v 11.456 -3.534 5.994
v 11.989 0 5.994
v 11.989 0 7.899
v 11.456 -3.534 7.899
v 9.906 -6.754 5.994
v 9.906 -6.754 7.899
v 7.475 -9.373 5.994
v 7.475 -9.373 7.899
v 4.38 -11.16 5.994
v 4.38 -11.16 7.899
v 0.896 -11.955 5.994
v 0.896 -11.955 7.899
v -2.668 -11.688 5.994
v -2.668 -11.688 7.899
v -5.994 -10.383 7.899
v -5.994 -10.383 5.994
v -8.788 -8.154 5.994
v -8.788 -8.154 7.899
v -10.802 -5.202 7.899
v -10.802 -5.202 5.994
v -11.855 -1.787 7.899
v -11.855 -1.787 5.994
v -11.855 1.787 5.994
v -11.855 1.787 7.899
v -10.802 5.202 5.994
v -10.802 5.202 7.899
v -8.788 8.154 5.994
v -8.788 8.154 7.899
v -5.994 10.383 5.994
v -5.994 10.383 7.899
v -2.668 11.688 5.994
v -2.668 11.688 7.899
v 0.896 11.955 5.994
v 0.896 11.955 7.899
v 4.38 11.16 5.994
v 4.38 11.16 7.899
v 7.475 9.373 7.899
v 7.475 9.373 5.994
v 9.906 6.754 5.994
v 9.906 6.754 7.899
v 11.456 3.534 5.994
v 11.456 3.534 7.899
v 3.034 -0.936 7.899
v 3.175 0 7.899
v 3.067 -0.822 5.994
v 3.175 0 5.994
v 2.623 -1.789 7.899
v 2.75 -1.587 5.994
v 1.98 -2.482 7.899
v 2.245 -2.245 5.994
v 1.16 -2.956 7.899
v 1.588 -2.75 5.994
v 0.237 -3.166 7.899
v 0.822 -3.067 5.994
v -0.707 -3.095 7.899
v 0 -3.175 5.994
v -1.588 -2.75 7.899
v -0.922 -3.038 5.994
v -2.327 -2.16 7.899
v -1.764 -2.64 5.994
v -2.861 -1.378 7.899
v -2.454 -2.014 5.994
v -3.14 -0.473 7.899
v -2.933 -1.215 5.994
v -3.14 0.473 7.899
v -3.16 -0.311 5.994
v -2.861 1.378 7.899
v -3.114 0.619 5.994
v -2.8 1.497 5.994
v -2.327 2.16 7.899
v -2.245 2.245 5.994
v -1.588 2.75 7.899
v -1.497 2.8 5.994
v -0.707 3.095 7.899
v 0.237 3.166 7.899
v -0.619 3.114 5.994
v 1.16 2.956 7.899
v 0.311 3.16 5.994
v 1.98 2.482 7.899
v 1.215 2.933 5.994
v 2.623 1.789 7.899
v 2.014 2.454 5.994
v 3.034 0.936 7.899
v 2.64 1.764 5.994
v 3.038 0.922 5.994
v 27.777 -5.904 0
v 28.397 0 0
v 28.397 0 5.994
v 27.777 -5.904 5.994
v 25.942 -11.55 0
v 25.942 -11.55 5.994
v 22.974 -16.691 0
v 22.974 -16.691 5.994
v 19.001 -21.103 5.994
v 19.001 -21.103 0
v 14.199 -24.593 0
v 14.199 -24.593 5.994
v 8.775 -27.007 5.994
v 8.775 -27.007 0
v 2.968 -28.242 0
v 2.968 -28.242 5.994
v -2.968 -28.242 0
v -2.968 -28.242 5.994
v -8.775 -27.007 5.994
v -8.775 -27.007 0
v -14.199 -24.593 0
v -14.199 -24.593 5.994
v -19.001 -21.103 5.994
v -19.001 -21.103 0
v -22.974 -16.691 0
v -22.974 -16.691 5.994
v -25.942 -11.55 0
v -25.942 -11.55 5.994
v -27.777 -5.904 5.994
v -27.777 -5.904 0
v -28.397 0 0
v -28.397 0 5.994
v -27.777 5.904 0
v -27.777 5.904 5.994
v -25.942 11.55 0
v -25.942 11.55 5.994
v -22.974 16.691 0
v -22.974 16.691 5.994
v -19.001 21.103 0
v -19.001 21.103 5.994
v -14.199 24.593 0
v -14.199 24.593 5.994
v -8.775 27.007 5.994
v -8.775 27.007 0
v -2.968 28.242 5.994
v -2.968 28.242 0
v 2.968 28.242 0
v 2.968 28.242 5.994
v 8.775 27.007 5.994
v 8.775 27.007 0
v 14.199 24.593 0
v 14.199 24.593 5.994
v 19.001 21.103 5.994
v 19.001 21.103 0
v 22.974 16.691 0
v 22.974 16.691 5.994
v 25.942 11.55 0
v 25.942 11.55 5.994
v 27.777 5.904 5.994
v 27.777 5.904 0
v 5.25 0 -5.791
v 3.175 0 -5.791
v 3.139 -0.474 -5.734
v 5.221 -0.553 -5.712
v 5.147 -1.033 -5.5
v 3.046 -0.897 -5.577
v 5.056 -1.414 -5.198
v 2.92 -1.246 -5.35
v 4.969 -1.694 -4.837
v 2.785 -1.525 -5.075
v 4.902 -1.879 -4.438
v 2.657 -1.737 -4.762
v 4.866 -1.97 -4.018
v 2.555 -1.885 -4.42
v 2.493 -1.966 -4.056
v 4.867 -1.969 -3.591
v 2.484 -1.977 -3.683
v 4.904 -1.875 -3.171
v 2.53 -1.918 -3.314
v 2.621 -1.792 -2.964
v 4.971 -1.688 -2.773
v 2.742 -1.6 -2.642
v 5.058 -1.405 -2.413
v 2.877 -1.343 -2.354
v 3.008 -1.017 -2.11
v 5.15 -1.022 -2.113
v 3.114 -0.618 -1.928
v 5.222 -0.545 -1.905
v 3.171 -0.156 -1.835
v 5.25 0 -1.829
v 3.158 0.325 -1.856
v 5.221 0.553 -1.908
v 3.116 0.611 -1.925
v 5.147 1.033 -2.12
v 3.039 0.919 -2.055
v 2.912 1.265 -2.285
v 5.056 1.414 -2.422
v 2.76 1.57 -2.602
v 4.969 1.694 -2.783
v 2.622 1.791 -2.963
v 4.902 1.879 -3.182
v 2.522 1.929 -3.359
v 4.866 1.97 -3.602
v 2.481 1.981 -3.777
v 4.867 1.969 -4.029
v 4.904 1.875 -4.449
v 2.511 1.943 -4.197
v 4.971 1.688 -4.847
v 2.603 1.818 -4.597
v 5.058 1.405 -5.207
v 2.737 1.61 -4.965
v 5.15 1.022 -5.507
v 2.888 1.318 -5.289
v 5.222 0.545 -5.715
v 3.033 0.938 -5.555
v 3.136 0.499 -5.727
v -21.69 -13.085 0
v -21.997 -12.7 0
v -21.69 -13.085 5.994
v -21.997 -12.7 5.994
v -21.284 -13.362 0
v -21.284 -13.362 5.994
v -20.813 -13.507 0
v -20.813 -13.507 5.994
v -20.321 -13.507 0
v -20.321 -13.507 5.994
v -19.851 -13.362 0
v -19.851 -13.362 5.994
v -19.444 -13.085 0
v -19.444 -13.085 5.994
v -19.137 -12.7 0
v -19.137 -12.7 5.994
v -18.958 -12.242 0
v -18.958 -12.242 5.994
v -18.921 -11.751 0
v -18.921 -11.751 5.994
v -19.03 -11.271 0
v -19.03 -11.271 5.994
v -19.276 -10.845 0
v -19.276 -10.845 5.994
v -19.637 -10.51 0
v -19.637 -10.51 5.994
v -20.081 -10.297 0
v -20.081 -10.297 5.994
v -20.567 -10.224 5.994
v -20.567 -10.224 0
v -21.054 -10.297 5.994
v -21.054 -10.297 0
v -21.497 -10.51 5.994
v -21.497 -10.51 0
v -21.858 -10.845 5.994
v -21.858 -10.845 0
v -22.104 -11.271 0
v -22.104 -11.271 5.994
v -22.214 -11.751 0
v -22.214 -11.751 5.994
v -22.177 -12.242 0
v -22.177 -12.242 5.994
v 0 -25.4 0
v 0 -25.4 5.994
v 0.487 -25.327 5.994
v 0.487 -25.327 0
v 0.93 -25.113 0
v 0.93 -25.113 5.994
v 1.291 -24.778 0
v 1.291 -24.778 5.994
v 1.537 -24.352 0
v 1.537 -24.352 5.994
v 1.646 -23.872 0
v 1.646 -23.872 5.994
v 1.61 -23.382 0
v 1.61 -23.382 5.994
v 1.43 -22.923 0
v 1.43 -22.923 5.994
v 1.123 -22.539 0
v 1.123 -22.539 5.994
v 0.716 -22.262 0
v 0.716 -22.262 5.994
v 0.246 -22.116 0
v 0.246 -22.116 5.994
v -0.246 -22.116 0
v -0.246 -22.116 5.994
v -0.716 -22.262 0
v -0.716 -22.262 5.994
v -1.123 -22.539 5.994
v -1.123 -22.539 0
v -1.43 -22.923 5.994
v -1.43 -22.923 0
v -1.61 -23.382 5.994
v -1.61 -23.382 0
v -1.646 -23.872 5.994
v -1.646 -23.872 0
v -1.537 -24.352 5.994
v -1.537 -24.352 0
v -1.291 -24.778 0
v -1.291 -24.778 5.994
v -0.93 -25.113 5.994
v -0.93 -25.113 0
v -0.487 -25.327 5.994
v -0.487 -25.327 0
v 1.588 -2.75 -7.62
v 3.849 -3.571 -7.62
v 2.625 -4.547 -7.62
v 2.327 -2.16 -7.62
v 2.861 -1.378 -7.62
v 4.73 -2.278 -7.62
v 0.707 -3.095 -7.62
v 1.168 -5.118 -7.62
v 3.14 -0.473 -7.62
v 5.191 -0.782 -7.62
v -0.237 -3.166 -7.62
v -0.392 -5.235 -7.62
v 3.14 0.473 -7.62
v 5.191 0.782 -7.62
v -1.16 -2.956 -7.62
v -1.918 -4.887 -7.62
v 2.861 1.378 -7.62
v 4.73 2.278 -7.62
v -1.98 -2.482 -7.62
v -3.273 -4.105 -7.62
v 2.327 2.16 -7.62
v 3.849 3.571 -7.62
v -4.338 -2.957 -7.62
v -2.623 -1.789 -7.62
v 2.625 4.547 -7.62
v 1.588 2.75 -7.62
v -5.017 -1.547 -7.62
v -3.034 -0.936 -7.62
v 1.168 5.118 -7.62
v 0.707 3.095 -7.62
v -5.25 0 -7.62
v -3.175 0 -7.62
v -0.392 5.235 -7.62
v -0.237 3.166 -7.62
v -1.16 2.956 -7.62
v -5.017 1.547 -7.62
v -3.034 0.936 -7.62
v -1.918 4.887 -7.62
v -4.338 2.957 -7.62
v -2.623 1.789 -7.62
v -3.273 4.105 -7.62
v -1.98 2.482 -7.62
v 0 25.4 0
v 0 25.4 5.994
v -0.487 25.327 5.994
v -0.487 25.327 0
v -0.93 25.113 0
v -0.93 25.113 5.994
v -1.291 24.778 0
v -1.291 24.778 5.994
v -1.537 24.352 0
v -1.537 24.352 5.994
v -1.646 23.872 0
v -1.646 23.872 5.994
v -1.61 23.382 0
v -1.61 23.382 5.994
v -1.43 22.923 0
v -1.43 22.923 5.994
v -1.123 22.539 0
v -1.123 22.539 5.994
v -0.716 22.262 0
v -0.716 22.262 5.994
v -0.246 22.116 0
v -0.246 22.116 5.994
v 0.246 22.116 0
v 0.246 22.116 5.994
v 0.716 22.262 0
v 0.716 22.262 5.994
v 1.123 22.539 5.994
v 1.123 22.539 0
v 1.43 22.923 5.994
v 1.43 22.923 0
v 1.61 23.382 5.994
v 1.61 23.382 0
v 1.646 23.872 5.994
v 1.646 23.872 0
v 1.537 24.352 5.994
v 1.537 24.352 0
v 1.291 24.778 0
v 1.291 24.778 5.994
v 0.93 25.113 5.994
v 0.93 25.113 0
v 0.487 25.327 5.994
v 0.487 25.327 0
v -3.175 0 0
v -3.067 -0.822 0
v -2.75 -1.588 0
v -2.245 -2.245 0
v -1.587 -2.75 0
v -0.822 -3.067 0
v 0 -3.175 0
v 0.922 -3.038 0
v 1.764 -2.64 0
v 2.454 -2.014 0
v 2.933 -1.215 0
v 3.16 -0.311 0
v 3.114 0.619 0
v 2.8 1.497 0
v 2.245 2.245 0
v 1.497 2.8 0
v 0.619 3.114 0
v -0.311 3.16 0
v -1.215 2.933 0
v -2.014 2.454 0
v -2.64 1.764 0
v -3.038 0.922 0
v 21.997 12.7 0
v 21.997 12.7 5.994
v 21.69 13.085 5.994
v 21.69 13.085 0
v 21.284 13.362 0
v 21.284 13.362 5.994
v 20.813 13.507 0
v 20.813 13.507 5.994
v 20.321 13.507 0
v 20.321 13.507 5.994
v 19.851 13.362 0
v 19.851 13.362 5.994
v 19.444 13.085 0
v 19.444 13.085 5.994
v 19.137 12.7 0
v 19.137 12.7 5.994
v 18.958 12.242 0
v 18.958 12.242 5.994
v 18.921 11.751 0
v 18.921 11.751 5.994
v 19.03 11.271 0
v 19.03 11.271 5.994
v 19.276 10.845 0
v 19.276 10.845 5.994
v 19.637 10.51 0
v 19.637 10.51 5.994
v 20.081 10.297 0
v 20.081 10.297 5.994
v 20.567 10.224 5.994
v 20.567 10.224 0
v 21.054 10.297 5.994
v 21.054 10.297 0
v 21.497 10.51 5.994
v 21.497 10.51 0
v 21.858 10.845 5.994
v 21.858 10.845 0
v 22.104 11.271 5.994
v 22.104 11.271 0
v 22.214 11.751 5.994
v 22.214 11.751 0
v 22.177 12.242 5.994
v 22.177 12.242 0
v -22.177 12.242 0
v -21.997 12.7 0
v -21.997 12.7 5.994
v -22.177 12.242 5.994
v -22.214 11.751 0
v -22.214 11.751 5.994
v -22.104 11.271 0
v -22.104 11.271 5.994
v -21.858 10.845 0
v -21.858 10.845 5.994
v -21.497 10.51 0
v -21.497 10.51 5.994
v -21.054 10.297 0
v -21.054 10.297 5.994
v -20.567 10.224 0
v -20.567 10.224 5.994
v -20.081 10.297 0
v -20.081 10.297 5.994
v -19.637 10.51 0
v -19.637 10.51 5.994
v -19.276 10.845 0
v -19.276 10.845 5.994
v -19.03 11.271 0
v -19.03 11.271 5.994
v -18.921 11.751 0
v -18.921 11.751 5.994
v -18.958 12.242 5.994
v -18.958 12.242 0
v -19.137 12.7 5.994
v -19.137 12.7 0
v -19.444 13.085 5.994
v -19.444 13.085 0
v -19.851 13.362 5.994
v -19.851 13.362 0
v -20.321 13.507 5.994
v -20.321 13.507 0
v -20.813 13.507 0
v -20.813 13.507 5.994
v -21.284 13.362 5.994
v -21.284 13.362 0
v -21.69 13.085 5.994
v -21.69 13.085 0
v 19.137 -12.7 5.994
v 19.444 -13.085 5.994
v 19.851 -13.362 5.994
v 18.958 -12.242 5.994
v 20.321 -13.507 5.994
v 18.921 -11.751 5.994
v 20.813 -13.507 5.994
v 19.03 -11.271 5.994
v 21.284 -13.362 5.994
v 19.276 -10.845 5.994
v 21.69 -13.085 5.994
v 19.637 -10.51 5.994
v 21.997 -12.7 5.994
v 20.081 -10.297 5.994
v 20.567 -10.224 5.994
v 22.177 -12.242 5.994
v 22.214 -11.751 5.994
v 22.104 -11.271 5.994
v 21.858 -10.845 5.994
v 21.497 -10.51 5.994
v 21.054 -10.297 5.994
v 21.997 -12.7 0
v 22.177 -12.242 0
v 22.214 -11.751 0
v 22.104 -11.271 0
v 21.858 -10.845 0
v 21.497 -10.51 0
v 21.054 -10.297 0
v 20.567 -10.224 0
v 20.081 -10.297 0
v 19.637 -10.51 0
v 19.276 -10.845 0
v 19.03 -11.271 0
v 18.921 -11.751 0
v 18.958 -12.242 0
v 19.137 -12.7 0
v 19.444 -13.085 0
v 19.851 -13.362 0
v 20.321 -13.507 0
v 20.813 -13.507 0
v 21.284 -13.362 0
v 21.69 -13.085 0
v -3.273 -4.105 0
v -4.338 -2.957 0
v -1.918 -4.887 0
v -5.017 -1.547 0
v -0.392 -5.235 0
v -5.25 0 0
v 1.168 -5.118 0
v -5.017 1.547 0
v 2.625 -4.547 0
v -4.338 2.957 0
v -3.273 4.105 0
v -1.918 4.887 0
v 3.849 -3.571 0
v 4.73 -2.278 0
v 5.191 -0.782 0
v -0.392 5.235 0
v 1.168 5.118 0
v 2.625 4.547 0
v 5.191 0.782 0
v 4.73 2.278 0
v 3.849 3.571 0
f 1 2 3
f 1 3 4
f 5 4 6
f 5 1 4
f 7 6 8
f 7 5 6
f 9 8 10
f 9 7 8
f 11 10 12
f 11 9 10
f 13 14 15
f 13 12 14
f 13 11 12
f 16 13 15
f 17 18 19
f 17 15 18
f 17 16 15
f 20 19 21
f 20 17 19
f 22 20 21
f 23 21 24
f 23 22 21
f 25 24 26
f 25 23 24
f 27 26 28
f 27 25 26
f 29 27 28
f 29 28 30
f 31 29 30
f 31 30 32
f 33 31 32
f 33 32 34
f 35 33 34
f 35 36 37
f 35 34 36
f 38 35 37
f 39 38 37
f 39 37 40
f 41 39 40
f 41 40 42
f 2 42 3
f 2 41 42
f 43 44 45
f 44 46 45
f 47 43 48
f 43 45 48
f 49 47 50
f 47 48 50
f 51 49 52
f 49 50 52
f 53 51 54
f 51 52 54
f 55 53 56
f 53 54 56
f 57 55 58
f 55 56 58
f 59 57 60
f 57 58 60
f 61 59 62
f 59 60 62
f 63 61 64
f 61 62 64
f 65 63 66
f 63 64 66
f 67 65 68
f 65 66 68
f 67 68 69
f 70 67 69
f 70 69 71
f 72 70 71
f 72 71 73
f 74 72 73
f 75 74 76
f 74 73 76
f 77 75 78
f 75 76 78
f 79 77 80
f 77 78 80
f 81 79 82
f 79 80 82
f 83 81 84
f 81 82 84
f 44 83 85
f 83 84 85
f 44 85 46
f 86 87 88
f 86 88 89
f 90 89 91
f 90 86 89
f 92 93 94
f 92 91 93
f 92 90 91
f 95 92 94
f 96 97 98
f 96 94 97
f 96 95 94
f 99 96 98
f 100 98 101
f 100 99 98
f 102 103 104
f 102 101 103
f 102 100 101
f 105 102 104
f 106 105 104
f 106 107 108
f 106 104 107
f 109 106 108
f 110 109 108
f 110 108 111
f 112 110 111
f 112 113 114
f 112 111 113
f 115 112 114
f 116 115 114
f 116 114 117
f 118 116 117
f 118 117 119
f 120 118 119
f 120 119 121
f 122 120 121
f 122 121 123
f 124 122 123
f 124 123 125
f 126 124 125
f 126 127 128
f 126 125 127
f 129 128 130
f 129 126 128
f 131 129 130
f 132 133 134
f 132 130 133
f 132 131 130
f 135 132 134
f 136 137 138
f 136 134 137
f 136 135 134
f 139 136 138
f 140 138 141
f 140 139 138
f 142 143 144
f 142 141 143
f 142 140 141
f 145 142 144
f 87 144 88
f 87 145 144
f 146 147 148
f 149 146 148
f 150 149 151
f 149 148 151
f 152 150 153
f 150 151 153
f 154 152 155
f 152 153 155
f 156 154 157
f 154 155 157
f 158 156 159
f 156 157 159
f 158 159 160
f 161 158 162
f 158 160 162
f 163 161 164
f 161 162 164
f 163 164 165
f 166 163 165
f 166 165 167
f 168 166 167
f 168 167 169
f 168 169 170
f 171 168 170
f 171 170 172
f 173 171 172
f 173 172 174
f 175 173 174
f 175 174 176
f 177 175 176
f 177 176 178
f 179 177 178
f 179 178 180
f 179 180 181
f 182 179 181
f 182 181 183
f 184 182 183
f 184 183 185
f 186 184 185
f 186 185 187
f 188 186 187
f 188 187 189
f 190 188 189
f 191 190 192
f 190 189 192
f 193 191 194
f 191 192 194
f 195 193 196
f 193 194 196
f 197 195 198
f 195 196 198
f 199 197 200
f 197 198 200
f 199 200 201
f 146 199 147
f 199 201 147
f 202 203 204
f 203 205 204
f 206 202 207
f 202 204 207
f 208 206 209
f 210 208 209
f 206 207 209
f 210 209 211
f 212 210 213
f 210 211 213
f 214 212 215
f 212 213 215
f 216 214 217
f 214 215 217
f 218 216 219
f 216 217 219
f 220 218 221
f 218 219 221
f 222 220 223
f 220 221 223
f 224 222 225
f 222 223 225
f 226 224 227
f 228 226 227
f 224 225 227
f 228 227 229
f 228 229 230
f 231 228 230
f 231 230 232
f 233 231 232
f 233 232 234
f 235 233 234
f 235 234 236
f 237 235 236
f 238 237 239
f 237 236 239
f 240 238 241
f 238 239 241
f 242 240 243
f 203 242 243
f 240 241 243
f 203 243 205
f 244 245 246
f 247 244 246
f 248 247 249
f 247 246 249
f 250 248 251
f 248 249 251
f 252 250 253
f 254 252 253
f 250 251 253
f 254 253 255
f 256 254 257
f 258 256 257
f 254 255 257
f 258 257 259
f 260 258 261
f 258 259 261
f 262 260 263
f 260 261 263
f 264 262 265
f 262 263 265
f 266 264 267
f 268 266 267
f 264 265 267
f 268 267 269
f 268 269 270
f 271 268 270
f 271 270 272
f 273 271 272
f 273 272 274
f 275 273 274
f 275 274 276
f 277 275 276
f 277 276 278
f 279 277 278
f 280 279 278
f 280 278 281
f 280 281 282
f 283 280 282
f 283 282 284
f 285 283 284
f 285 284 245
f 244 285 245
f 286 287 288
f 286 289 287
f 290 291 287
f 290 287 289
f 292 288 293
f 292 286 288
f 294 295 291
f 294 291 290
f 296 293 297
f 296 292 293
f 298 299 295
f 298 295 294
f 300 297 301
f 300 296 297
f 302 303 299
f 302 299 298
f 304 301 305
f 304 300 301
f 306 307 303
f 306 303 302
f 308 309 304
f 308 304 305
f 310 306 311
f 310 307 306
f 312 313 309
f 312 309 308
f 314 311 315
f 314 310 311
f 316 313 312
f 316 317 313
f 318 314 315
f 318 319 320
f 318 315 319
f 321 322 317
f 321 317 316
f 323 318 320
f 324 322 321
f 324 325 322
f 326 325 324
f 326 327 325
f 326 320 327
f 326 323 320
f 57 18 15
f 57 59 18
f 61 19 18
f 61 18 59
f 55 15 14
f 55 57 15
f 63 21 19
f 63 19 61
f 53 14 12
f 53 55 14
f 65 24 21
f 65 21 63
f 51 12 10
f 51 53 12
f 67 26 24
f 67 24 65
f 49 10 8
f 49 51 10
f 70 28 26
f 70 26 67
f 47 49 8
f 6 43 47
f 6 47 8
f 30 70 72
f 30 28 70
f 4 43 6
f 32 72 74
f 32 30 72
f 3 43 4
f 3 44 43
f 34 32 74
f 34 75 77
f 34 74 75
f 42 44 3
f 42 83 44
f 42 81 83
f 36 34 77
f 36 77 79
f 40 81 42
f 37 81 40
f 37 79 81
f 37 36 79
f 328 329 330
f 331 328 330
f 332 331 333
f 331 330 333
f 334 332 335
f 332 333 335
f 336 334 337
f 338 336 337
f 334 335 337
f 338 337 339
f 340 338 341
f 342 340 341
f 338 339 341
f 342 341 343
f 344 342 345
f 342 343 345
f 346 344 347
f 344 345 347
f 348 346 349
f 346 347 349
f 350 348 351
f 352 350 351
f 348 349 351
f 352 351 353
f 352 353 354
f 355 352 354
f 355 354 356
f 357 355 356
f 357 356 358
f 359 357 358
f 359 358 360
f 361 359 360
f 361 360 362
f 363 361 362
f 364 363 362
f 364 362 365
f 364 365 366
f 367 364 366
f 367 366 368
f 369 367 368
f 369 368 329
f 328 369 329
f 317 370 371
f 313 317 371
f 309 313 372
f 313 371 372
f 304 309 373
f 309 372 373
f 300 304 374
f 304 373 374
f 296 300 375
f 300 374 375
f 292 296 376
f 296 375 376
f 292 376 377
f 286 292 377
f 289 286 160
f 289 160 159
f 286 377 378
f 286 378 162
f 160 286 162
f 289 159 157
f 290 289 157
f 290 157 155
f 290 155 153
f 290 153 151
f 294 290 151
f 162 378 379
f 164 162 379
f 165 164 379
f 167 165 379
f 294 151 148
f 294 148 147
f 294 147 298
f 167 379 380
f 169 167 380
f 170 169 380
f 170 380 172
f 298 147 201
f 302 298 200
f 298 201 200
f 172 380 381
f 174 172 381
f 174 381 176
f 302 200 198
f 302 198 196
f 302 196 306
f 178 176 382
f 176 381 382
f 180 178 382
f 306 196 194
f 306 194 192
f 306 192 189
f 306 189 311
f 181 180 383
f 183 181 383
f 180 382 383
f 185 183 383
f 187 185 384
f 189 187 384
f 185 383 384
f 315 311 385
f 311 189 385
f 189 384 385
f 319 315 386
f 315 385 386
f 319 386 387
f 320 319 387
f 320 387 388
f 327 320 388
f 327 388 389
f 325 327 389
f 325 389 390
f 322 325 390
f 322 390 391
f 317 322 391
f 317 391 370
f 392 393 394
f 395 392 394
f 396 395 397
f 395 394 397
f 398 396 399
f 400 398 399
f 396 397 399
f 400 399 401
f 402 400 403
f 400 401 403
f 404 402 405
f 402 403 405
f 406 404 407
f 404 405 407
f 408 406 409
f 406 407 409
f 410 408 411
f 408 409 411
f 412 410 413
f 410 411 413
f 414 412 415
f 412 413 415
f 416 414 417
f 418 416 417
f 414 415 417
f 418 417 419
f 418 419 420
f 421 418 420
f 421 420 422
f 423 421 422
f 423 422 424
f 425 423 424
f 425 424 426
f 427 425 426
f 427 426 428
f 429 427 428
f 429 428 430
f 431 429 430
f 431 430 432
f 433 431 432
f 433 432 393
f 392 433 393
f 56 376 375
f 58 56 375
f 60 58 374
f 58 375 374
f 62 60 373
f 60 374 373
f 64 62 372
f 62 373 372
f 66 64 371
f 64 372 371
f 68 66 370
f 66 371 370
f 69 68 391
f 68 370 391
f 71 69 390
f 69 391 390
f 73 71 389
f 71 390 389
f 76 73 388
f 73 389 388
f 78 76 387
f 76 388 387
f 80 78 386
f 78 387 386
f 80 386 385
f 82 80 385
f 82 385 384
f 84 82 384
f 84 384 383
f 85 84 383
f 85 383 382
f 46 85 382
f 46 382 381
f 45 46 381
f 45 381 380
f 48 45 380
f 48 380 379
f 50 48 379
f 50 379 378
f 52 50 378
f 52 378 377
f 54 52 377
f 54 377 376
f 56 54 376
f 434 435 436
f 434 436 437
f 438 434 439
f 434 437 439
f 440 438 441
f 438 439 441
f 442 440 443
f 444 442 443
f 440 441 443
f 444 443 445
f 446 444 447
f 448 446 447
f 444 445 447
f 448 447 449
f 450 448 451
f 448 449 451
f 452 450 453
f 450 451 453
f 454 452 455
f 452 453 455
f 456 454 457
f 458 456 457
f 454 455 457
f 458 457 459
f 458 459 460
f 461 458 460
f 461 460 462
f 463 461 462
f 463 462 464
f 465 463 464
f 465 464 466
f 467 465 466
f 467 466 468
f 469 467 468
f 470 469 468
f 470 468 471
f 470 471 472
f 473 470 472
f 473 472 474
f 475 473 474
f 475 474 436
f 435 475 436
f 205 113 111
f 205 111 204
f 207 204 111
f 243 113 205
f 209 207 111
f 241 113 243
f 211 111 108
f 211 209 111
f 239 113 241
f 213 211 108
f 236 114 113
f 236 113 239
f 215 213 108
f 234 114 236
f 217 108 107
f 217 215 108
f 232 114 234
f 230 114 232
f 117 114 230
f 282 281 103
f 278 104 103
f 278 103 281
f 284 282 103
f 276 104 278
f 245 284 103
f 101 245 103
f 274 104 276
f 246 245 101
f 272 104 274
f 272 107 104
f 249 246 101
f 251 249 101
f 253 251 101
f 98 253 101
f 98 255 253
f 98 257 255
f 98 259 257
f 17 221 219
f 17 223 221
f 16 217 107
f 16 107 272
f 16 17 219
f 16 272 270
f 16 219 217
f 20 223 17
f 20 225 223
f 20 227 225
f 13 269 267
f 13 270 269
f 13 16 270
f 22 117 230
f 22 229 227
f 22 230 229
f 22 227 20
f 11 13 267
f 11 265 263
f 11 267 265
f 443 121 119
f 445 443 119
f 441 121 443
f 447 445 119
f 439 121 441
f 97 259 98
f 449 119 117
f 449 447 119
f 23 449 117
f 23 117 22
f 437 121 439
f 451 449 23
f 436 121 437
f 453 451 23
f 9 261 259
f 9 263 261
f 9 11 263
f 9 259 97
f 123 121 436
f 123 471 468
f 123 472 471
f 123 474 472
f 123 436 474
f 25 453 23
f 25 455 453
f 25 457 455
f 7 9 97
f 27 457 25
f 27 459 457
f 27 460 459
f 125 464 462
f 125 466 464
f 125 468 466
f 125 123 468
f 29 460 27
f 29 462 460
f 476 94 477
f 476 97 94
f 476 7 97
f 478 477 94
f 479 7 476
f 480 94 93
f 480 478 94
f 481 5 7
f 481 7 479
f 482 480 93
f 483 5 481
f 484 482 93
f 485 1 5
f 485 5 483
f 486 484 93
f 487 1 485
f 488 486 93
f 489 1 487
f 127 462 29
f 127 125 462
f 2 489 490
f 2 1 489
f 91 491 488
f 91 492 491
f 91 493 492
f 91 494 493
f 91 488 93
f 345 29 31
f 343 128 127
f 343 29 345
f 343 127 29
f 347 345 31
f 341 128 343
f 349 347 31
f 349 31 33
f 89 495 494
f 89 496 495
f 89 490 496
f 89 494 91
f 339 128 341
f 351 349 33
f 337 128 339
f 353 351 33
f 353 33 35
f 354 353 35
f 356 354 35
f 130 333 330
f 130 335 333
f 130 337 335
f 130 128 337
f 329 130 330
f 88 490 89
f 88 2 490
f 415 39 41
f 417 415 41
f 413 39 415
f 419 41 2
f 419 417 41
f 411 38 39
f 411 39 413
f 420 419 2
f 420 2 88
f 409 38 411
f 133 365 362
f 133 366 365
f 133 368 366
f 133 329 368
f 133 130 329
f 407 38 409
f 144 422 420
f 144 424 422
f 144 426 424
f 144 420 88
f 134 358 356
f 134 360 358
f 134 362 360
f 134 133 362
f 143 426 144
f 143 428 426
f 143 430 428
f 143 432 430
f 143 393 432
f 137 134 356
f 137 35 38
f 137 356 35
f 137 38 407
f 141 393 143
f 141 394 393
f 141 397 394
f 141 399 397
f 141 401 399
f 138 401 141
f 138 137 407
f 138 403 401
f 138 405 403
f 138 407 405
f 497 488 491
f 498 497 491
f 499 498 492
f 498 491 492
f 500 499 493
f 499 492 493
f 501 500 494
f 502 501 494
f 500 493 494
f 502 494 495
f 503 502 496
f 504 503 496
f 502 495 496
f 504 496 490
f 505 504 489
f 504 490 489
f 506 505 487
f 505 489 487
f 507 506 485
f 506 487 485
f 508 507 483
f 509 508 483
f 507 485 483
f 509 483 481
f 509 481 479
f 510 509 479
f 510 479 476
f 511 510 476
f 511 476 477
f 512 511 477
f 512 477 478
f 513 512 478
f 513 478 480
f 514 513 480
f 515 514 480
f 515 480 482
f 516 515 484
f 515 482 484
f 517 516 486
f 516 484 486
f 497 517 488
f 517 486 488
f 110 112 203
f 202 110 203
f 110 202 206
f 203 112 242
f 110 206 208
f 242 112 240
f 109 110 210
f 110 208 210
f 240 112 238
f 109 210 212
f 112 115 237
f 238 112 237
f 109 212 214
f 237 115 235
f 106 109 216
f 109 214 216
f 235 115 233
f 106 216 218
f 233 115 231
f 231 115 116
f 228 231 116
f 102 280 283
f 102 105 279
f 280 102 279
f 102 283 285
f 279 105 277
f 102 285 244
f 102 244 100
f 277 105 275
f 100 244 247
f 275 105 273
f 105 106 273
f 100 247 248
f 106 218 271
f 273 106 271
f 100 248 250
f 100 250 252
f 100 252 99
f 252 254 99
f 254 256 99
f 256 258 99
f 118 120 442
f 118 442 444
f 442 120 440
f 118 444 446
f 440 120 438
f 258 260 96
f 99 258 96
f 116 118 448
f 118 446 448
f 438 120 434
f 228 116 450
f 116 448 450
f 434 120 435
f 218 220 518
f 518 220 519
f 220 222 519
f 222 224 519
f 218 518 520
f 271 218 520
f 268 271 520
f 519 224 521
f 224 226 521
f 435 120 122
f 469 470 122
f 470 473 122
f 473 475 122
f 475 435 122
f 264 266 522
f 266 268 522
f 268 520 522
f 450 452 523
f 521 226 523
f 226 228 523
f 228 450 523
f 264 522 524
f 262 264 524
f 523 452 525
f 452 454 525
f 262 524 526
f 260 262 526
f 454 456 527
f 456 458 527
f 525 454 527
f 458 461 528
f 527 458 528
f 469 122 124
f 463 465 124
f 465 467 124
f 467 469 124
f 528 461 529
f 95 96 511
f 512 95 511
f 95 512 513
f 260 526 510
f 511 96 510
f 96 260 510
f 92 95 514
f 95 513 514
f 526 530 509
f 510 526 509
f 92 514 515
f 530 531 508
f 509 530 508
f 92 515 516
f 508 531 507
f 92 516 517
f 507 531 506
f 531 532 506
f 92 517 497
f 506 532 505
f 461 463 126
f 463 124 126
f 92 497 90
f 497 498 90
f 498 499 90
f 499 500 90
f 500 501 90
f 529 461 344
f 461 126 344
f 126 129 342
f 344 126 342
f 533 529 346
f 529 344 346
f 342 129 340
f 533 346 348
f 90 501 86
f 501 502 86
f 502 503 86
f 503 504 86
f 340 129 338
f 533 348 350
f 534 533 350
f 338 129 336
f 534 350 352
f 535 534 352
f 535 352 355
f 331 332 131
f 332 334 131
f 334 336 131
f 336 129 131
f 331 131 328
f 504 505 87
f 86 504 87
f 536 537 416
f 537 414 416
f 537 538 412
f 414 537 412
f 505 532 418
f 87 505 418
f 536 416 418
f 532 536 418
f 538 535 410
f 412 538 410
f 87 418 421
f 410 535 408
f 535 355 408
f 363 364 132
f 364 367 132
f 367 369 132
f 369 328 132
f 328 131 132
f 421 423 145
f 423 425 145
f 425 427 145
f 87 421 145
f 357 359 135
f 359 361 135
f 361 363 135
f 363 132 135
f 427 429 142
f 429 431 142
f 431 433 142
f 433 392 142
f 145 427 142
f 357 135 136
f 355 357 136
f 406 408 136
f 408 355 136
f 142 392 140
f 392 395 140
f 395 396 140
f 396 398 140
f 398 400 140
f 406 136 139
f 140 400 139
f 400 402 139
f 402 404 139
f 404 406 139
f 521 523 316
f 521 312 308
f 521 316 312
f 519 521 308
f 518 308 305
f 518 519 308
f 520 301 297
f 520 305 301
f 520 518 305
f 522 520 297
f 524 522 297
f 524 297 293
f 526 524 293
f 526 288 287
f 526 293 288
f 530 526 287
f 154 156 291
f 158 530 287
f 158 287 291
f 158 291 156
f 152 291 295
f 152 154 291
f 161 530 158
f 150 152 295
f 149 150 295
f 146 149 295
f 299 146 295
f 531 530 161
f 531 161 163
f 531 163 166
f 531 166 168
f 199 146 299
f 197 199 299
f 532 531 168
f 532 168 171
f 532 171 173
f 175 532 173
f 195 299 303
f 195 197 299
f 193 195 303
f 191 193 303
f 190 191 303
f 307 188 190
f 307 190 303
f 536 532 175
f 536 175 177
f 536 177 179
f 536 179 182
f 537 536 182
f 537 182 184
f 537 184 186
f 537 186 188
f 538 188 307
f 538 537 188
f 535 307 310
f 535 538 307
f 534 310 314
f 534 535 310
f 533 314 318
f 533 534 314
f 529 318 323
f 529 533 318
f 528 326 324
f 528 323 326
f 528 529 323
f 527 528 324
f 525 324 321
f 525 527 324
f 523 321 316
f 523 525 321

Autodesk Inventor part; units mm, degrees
ref_plane "YZ Plane" through (0, 0, 0) normal (1, 0, 0) x (0, 1, 0)
ref_plane "XZ Plane" through (0, 0, 0) normal (0, 1, 0) x (-1, 0, 0)
sketch "Sketch1" plane through (0, 0, 0) normal (0, 0, 1) x (1, 0, 0)
  circle A0 centre (0, 0) radius 28.3972
  dimension "d0" = 56.7944
extrude "Extrusion1" add sketch "Sketch1" along normal blind 5.9944
sketch "Sketch2" plane through (0, 0, 5.9944) normal (0, 0, 1) x (1, 0, 0)
  point P0 (0, 0)
  point P1 (0, 0)
hole "Hole1" at (0, 0, 5.9944) direction (0, 0, -1) diameter 6.35 depth 5.9944
sketch "Sketch3" plane through (0, 0, 0) normal (0, 0, -1) x (-1, 0, 0)
  circle A0 centre (0, 0) radius 3.175 construction
  line L0 (0, 0) -> (0, 23.749) construction
  dimension "d10" = 23.749
hole "Hole2" at (0, 23.749, 0) direction (0, 0, 1) diameter 3.302 depth 12.2936 tip angle 118 thread size "8-32 UNC" class "2B" standard "ANSI Unified Screw Threads"
pattern_circular "Circular Pattern1" count 6 over 360 about axis through (0, 0, 2.9972) along (0, 0, 1) of "Hole2"
sketch "Sketch4" plane through (0, 0, 5.9944) normal (0, 0, 1) x (1, 0, 0)
  circle A0 centre (0, 0) radius 3.175 projected
  circle A1 centre (0, 0) radius 11.9888
  dimension "d22" = 23.9776
extrude "Extrusion2" add sketch "Sketch4" along normal blind 1.905
sketch "Sketch5" plane through (0, 0, 0) normal (0, 0, -1) x (-1, 0, 0)
  circle A0 centre (0, 0) radius 5.25
  circle A1 centre (0, 0) radius 3.175
  dimension "d25" = 10.5
extrude "Extrusion3" add sketch "Sketch5" along normal blind 7.62
sketch "Sketch6" plane through (0, 0, -7.62) normal (0, 0, -1) x (-1, 0, 0)
  circle A0 centre (0, 0) radius 5.25 projected
  point P0 (-5.25, 0)
ref_plane "Work Plane1" through (5.25, 0, -7.62) normal (1, 0, 0) x (0, 1, 0)
sketch "Sketch7" plane through (5.25, 0, -7.62) normal (1, 0, 0) x (0, 1, 0)
  line L0 (0, 0) -> (0, 3.81) construction
  point P0 (0, 7.62)
  dimension "d28" = 3.81
hole "Hole3" at (5.25, 0, -3.81) direction (-1, 0, 0) diameter 3.9624 depth 6.35 tip angle 118 thread size "10-32 UNF" class "2B" standard "ANSI Unified Screw Threads"
properties part number "Mecanum Wheel Adapter Plate"
